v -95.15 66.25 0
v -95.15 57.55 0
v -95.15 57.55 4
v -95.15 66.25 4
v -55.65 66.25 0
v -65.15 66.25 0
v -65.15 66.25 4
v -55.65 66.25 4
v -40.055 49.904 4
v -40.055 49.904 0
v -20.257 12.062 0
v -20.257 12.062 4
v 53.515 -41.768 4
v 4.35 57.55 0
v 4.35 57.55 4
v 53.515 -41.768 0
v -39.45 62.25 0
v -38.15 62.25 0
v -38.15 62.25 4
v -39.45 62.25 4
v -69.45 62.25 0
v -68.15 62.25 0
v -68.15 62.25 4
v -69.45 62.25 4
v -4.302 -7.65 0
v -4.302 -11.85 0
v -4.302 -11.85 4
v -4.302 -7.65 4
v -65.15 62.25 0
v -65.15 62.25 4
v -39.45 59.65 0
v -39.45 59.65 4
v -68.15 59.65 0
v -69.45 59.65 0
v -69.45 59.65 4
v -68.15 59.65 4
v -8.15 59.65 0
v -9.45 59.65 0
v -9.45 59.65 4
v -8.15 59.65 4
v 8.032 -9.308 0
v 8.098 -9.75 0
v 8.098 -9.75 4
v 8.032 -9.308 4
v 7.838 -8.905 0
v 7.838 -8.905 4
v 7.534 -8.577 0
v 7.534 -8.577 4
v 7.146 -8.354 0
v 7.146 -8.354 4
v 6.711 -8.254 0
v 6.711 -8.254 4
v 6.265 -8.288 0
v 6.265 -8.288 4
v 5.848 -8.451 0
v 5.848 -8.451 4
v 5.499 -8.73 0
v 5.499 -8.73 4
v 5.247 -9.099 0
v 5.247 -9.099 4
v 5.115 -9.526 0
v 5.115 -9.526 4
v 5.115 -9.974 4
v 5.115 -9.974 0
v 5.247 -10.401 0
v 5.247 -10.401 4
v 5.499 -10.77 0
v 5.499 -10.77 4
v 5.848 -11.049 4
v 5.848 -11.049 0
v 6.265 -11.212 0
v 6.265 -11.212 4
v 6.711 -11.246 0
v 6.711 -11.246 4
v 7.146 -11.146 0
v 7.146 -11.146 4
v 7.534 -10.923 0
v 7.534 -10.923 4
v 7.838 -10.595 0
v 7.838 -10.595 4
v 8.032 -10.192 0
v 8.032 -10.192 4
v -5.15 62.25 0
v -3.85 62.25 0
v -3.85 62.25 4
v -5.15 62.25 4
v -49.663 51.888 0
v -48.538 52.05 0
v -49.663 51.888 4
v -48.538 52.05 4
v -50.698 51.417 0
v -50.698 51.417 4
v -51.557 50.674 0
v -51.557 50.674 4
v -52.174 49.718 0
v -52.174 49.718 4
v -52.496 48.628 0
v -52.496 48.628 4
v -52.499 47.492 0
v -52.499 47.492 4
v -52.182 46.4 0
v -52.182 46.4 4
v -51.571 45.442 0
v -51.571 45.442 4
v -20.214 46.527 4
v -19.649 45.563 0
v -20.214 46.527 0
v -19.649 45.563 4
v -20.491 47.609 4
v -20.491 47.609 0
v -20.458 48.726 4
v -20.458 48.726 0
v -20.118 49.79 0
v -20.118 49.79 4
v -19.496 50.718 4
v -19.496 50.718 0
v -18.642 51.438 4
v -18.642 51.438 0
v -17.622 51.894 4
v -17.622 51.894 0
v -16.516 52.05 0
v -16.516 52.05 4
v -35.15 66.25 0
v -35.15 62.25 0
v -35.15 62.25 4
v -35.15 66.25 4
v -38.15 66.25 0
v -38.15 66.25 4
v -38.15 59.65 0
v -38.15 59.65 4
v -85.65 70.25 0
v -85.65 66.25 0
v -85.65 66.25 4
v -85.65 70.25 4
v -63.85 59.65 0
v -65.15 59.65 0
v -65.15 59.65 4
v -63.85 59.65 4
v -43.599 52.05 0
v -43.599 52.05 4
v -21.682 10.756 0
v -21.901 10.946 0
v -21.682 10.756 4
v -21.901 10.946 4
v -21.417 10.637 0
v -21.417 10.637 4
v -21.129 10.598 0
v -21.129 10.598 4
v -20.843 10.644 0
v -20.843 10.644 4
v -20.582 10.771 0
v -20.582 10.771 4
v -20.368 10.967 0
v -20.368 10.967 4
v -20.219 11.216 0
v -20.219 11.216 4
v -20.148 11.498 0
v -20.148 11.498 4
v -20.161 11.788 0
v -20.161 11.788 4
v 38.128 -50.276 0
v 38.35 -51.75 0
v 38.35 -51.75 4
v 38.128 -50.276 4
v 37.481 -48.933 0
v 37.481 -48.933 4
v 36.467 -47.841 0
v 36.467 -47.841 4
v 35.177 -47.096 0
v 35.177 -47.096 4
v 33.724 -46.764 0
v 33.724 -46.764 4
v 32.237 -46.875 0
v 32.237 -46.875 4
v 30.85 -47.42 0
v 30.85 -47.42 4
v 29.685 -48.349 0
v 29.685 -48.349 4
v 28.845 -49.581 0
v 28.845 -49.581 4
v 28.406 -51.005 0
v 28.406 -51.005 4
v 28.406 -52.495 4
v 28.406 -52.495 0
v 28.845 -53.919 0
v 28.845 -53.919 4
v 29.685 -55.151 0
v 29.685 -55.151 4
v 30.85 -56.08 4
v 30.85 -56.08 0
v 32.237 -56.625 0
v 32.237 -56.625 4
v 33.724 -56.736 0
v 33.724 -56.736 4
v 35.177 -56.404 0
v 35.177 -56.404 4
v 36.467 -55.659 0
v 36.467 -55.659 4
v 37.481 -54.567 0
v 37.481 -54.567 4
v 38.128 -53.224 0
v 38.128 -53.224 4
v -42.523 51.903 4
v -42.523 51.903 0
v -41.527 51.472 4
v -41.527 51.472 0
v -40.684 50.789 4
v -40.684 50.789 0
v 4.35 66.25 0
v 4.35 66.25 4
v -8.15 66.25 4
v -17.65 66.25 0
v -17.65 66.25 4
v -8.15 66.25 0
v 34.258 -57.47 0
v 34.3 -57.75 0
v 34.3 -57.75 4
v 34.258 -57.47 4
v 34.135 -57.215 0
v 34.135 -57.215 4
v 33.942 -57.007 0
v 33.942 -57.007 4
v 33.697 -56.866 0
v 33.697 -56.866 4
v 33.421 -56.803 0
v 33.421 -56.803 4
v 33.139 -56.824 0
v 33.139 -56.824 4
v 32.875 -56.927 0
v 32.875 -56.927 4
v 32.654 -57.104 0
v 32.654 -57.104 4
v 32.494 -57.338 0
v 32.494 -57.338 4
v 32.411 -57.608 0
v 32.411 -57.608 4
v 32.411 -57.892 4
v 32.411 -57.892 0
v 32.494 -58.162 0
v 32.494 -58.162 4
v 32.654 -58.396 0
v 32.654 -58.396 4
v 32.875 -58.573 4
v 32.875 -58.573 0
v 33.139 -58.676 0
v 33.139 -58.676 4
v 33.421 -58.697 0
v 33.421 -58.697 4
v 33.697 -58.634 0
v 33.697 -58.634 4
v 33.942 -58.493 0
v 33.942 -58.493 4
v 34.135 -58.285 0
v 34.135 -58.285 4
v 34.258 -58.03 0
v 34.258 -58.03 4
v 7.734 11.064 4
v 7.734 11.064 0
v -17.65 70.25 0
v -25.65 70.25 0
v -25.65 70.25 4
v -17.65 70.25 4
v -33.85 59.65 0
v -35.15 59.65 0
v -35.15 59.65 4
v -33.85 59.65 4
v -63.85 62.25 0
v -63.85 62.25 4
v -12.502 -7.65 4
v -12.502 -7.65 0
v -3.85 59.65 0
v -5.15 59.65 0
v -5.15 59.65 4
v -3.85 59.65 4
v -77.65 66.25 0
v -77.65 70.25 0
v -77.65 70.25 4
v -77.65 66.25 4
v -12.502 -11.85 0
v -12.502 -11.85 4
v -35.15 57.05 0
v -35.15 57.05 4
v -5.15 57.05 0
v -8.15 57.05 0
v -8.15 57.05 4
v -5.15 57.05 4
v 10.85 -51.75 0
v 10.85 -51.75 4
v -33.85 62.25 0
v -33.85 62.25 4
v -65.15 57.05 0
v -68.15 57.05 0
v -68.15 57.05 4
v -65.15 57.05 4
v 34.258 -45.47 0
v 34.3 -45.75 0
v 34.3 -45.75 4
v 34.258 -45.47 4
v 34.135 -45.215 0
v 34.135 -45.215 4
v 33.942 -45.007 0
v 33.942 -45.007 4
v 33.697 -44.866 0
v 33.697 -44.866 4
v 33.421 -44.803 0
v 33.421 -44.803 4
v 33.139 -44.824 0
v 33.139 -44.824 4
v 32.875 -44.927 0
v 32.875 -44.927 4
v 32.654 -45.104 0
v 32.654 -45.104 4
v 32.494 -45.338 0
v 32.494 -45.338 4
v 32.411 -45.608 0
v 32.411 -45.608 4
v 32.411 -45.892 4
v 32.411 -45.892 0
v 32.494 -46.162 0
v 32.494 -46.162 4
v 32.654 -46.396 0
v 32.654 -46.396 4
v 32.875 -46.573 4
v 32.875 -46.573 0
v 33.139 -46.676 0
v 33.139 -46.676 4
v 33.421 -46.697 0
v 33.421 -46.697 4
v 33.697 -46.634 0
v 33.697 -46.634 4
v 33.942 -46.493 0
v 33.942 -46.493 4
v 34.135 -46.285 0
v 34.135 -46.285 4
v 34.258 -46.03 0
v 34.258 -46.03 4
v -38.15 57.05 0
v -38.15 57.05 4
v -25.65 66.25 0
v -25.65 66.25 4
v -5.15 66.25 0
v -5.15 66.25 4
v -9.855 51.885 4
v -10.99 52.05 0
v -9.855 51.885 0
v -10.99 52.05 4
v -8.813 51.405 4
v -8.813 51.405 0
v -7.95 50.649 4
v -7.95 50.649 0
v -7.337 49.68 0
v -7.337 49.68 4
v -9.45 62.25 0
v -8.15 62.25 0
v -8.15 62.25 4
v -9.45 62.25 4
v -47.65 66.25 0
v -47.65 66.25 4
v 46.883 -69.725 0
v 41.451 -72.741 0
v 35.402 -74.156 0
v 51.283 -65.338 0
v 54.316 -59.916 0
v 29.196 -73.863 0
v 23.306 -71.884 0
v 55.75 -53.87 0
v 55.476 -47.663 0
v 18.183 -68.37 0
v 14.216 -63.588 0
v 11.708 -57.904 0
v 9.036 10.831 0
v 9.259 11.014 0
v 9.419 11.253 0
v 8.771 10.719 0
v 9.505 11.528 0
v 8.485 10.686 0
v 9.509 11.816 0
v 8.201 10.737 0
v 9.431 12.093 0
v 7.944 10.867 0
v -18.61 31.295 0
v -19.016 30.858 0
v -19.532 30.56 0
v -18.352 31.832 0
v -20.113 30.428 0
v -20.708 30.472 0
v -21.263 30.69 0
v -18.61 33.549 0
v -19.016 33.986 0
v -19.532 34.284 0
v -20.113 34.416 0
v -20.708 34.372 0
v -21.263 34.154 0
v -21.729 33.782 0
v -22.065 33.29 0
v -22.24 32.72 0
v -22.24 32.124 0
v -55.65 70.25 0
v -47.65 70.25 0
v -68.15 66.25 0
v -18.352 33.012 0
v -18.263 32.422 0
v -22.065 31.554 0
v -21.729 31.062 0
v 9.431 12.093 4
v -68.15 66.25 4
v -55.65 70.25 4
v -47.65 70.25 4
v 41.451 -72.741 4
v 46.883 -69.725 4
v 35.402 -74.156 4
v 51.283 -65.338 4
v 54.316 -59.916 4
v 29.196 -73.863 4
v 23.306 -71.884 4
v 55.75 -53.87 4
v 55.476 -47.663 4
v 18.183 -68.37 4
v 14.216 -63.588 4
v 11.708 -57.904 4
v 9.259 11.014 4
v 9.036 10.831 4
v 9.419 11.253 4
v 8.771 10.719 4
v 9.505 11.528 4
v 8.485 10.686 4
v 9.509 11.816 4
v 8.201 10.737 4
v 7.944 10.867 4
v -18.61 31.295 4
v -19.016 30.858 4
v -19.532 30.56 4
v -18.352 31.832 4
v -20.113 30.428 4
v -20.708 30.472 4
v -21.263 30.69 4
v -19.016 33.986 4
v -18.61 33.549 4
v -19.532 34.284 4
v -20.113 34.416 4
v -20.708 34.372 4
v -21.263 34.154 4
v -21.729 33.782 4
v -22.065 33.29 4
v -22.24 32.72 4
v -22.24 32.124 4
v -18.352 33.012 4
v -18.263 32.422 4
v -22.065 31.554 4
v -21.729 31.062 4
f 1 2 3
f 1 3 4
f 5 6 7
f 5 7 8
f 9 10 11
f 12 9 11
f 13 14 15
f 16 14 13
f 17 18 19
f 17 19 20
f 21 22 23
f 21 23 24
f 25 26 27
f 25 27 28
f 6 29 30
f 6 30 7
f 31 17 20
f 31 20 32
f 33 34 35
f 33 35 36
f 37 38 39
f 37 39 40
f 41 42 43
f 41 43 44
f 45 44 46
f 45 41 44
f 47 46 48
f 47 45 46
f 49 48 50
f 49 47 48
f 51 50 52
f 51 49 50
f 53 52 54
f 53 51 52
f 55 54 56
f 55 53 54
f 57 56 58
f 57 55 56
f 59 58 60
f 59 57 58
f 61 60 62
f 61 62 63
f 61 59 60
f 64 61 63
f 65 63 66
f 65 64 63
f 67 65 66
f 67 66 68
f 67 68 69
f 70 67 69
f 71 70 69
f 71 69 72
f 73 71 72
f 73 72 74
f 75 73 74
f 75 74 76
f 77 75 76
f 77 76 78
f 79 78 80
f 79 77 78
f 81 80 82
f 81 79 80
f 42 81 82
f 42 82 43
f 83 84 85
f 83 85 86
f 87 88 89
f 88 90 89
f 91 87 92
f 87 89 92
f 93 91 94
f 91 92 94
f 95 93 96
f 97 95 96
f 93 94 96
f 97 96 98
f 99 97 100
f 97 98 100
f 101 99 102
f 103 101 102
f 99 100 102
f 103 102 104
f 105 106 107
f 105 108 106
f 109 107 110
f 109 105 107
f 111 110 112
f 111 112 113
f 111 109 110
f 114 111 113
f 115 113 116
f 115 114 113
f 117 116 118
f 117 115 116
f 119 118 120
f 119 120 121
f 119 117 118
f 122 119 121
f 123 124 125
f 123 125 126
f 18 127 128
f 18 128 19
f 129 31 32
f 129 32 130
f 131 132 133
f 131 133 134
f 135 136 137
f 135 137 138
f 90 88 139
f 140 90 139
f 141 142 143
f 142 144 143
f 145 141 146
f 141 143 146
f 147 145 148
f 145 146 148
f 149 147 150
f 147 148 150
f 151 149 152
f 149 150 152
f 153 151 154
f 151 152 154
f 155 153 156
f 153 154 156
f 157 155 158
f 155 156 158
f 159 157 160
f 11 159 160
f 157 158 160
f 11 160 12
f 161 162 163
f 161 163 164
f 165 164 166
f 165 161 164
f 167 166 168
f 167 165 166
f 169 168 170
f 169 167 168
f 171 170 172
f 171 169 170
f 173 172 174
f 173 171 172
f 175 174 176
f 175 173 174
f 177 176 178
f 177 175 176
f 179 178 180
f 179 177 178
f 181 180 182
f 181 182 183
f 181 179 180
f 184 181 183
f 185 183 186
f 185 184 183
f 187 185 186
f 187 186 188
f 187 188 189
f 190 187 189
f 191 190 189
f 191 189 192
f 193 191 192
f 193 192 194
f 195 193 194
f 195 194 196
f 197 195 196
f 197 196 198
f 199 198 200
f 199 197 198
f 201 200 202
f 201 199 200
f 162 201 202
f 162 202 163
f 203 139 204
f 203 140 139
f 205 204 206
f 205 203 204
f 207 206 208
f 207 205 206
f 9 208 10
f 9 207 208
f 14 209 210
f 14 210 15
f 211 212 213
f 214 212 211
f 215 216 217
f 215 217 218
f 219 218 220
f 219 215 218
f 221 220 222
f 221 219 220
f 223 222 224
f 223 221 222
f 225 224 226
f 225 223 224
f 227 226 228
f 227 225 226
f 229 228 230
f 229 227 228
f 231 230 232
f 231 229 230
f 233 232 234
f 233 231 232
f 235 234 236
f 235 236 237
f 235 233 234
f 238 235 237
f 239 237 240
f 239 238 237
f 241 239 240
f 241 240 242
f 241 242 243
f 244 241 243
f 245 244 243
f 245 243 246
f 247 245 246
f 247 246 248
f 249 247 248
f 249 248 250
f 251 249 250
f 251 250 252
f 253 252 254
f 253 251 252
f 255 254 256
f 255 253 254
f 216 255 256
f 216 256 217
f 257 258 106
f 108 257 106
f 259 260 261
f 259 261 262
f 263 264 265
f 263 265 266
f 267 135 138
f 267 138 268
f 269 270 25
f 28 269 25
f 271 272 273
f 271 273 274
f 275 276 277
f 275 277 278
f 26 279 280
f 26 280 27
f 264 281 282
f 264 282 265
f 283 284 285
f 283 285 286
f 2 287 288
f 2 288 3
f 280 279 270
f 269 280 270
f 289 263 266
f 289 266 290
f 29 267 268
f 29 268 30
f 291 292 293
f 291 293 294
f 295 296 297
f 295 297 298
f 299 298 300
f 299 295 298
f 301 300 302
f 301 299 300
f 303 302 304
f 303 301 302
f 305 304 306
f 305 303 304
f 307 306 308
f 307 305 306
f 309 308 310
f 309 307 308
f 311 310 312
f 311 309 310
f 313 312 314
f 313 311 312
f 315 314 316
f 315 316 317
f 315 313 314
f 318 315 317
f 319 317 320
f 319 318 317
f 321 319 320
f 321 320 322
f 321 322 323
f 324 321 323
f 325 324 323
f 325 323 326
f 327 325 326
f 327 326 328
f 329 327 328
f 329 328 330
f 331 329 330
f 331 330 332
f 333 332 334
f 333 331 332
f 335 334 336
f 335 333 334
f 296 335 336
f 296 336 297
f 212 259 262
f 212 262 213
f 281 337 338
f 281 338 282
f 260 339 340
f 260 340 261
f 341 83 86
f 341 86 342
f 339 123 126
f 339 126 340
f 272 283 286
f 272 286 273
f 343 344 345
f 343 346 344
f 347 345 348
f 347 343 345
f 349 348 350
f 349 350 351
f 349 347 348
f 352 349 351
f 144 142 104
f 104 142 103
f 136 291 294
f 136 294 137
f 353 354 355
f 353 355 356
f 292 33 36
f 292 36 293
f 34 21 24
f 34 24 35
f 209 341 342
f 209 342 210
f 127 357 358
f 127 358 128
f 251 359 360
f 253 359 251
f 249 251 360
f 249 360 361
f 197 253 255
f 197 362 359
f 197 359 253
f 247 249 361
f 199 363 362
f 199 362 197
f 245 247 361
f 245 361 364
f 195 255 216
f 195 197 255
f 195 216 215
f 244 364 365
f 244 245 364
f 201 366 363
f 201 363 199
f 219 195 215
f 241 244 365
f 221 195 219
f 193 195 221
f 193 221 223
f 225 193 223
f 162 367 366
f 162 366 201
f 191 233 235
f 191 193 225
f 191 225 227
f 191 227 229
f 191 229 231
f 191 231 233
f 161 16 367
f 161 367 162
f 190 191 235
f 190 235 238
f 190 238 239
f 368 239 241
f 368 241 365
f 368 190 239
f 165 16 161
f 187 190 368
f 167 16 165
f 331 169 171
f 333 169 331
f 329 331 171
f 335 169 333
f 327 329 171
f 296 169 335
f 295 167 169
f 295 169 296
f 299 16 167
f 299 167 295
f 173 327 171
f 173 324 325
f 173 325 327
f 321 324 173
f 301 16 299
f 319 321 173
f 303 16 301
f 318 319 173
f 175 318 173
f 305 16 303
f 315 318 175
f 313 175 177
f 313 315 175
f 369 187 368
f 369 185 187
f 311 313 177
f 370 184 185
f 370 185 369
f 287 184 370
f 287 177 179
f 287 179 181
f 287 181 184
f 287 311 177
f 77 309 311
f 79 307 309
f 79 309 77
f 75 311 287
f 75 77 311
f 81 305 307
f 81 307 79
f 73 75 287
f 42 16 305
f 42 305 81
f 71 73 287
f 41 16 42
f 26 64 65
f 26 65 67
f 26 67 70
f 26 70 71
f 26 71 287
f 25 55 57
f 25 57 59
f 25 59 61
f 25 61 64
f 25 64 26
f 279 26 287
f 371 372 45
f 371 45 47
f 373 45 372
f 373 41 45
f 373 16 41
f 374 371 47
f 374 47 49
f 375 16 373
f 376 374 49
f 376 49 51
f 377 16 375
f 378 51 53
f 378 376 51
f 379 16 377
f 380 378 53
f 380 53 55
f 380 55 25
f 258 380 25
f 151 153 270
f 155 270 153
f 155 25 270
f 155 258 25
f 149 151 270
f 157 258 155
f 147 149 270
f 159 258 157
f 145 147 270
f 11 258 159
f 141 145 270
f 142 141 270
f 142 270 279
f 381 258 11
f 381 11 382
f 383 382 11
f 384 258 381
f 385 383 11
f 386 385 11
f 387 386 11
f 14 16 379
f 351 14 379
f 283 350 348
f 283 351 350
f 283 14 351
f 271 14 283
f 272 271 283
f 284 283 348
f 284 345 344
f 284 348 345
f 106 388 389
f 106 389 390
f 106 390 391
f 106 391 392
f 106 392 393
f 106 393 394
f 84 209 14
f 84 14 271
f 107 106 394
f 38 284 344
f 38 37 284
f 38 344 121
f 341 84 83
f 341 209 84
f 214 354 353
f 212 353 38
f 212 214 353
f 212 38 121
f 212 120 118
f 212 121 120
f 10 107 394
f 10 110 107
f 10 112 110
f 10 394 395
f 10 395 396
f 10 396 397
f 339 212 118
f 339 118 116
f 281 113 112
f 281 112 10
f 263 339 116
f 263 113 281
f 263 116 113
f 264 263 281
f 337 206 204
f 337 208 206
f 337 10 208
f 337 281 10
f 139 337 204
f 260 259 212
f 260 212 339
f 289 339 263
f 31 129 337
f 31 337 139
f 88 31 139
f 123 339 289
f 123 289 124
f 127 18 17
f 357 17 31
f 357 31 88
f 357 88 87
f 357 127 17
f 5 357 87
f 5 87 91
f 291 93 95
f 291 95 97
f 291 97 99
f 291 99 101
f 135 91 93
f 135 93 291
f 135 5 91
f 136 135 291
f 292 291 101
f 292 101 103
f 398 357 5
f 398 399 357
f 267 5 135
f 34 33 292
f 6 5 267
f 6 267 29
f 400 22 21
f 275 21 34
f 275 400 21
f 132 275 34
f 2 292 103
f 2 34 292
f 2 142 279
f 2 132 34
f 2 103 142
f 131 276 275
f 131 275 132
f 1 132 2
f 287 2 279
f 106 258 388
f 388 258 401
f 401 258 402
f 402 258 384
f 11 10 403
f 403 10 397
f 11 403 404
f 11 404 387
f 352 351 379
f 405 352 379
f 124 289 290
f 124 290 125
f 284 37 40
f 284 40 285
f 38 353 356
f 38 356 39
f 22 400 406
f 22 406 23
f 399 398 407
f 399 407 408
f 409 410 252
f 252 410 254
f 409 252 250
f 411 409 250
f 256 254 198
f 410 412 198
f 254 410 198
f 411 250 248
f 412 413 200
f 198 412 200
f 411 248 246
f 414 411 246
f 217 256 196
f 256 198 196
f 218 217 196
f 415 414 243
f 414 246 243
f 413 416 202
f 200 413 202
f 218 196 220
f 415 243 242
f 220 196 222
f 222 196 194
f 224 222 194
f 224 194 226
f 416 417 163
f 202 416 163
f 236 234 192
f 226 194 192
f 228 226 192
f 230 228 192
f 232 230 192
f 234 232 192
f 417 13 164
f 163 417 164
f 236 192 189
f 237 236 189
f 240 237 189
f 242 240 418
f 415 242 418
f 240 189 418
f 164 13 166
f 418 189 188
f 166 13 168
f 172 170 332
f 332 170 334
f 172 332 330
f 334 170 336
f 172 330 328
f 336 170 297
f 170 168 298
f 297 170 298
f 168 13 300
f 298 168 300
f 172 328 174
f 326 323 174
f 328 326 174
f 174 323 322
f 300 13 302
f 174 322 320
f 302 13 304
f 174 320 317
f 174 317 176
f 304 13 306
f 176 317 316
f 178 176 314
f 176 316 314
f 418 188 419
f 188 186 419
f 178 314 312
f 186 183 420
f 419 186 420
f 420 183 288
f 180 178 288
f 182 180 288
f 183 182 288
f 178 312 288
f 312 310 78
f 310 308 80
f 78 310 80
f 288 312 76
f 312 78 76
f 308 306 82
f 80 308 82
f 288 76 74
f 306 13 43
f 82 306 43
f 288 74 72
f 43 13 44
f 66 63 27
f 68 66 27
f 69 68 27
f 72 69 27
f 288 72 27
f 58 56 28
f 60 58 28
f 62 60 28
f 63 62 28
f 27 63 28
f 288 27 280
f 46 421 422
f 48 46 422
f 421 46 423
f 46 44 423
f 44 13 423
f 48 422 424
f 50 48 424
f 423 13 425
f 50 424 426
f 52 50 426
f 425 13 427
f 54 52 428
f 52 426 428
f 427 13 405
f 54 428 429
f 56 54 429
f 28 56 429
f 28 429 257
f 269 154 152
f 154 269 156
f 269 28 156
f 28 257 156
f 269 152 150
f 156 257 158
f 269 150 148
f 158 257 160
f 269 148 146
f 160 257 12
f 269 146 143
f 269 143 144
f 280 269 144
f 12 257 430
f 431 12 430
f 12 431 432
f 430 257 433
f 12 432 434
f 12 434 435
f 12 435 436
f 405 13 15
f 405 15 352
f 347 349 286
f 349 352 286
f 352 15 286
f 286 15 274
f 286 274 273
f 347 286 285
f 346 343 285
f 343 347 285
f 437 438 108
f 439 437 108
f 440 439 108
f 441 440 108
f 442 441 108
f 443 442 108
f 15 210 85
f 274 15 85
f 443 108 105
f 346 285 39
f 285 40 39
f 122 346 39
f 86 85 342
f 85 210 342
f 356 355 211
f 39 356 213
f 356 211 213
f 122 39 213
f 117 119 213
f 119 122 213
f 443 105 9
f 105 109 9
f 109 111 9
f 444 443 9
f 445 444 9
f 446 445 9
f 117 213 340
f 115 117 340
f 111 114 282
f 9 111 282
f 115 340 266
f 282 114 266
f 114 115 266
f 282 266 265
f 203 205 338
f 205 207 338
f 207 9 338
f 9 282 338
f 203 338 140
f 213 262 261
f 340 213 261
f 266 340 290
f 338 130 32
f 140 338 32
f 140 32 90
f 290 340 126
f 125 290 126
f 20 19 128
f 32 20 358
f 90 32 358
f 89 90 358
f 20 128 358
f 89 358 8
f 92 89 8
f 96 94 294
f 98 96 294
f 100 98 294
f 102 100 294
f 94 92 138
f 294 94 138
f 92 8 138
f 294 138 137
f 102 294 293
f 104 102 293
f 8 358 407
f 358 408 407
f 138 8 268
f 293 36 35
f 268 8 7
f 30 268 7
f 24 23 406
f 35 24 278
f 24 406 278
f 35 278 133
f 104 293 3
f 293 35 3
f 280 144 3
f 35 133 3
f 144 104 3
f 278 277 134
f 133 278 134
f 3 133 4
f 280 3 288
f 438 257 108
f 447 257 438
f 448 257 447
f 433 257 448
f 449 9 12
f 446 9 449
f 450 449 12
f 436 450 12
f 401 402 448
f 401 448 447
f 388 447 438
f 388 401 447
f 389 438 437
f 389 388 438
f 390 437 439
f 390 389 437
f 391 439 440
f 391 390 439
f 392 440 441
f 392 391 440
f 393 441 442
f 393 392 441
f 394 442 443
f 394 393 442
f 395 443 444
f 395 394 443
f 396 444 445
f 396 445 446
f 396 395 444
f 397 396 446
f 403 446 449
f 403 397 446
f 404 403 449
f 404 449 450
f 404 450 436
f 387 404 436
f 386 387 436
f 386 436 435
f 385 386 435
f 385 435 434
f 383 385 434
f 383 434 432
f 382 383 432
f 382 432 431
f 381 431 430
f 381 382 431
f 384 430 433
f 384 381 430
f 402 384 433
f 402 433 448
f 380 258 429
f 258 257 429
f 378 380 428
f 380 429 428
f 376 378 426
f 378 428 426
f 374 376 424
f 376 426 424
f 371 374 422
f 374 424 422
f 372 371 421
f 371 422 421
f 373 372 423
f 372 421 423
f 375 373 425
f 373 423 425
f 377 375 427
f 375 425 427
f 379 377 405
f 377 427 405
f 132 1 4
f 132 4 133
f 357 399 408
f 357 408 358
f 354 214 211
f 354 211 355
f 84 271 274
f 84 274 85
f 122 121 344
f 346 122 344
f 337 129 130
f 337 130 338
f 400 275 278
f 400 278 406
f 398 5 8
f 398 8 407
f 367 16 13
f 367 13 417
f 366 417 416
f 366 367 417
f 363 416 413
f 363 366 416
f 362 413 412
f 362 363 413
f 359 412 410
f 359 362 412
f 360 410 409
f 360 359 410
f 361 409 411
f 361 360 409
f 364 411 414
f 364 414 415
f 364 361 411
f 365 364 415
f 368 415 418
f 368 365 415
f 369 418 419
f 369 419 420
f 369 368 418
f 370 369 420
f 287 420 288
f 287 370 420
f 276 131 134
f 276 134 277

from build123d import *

# Parameters (mm, degrees)
SKETCH_1_R      = 2
SKETCH_1_R_2    = 1.5
SKETCH_1_R_3    = 5
SKETCH_1_R_4    = 0.95
SKETCH_1_W      = 8.2
SKETCH_1_H      = 4.2
EXTRUDE_1_DEPTH = 4
FILLET_1_R      = 4
FILLET_2_R      = 1


with BuildPart() as part:
    # 草图1 → 凸台-拉伸1 (new body)
    with BuildSketch(Plane.XY):
        with BuildLine():
            Line((-38.15, 66.25), (-38.15, 62.25))
            Line((-38.15, 62.25), (-39.45, 62.25))
            Line((-39.45, 62.25), (-39.45, 59.65))
            Line((-39.45, 59.65), (-38.15, 59.65))
            Line((-38.15, 59.65), (-38.15, 57.05))
            Line((-38.15, 57.05), (-35.15, 57.05))
            Line((-35.15, 57.05), (-35.15, 59.65))
            Line((-35.15, 59.65), (-33.85, 59.65))
            Line((-33.85, 59.65), (-33.85, 62.25))
            Line((-33.85, 62.25), (-35.15, 62.25))
            Line((-35.15, 62.25), (-35.15, 66.25))
            Line((-35.15, 66.25), (-25.65, 66.25))
            Line((-25.65, 66.25), (-25.65, 70.25))
            Line((-25.65, 70.25), (-17.65, 70.25))
            Line((-17.65, 70.25), (-17.65, 66.25))
            Line((-17.65, 66.25), (-8.15, 66.25))
            Line((-8.15, 66.25), (-8.15, 62.25))
            Line((-8.15, 62.25), (-9.45, 62.25))
            Line((-9.45, 62.25), (-9.45, 59.65))
            Line((-9.45, 59.65), (-8.15, 59.65))
            Line((-8.15, 59.65), (-8.15, 57.05))
            Line((-8.15, 57.05), (-5.15, 57.05))
            Line((-5.15, 57.05), (-5.15, 59.65))
            Line((-5.15, 59.65), (-3.85, 59.65))
            Line((-3.85, 59.65), (-3.85, 62.25))
            Line((-3.85, 62.25), (-5.15, 62.25))
            Line((-5.15, 62.25), (-5.15, 66.25))
            Line((-5.15, 66.25), (4.35, 66.25))
            Line((4.35, 66.25), (4.35, 57.55))
            Line((4.35, 57.55), (53.51460577, -41.768082641))
            ThreePointArc((53.51460577, -41.768082641), (38.475737517, -73.658373169), (10.85, -51.75))
            Line((10.85, -51.75), (-95.15, 57.55))
            Line((-95.15, 57.55), (-95.15, 66.25))
            Line((-95.15, 66.25), (-85.65, 66.25))
            Line((-85.65, 66.25), (-85.65, 70.25))
            Line((-85.65, 70.25), (-77.65, 70.25))
            Line((-77.65, 70.25), (-77.65, 66.25))
            Line((-77.65, 66.25), (-68.15, 66.25))
            Line((-68.15, 66.25), (-68.15, 62.25))
            Line((-68.15, 62.25), (-69.45, 62.25))
            Line((-69.45, 62.25), (-69.45, 59.65))
            Line((-69.45, 59.65), (-68.15, 59.65))
            Line((-68.15, 59.65), (-68.15, 57.05))
            Line((-68.15, 57.05), (-65.15, 57.05))
            Line((-65.15, 57.05), (-65.15, 59.65))
            Line((-65.15, 59.65), (-63.85, 59.65))
            Line((-63.85, 59.65), (-63.85, 62.25))
            Line((-63.85, 62.25), (-65.15, 62.25))
            Line((-65.15, 62.25), (-65.15, 66.25))
            Line((-65.15, 66.25), (-55.65, 66.25))
            Line((-55.65, 66.25), (-55.65, 70.25))
            Line((-55.65, 70.25), (-47.65, 70.25))
            Line((-47.65, 70.25), (-47.65, 66.25))
            Line((-47.65, 66.25), (-38.15, 66.25))
        make_face()
        with Locations((-20.262745434, 32.422010331)):
            Circle(SKETCH_1_R, mode=Mode.SUBTRACT)
        with Locations((6.598407643, -9.75)):
            Circle(SKETCH_1_R_2, mode=Mode.SUBTRACT)
        with Locations((33.35, -51.75)):
            Circle(SKETCH_1_R_3, mode=Mode.SUBTRACT)
        with Locations((33.35, -45.75)):
            Circle(SKETCH_1_R_4, mode=Mode.SUBTRACT)
        with Locations((33.35, -57.75)):
            Circle(SKETCH_1_R_4, mode=Mode.SUBTRACT)
        with Locations((-8.401592357, -9.75)):
            Rectangle(SKETCH_1_W, SKETCH_1_H, mode=Mode.SUBTRACT)
        Polygon((-57.254487093, 52.05), (-41.177109745, 52.05), (-16.214099548, 4.334114018), align=None, mode=Mode.SUBTRACT)
        Polygon((12.65644769, 4.86329261), (-24.797659566, 52.05), (-8.394400914, 52.05), align=None, mode=Mode.SUBTRACT)
    extrude(amount=EXTRUDE_1_DEPTH)

    # 圆角1
    fillet_1_edges = [part.edges().sort_by_distance(p)[0] for p in [
        (-57.254487093, 52.05, 2),
        (-41.177109745, 52.05, 2),
        (-8.394400914, 52.05, 2),
        (-24.797659566, 52.05, 2),
    ]]
    fillet(fillet_1_edges, radius=FILLET_1_R)

    # 圆角2
    fillet_2_edges = [part.edges().sort_by_distance(p)[0] for p in [
        (-16.214099548, 4.334114018, 2),
        (12.65644769, 4.86329261, 2),
    ]]
    fillet(fillet_2_edges, radius=FILLET_2_R)


solid = part.part
